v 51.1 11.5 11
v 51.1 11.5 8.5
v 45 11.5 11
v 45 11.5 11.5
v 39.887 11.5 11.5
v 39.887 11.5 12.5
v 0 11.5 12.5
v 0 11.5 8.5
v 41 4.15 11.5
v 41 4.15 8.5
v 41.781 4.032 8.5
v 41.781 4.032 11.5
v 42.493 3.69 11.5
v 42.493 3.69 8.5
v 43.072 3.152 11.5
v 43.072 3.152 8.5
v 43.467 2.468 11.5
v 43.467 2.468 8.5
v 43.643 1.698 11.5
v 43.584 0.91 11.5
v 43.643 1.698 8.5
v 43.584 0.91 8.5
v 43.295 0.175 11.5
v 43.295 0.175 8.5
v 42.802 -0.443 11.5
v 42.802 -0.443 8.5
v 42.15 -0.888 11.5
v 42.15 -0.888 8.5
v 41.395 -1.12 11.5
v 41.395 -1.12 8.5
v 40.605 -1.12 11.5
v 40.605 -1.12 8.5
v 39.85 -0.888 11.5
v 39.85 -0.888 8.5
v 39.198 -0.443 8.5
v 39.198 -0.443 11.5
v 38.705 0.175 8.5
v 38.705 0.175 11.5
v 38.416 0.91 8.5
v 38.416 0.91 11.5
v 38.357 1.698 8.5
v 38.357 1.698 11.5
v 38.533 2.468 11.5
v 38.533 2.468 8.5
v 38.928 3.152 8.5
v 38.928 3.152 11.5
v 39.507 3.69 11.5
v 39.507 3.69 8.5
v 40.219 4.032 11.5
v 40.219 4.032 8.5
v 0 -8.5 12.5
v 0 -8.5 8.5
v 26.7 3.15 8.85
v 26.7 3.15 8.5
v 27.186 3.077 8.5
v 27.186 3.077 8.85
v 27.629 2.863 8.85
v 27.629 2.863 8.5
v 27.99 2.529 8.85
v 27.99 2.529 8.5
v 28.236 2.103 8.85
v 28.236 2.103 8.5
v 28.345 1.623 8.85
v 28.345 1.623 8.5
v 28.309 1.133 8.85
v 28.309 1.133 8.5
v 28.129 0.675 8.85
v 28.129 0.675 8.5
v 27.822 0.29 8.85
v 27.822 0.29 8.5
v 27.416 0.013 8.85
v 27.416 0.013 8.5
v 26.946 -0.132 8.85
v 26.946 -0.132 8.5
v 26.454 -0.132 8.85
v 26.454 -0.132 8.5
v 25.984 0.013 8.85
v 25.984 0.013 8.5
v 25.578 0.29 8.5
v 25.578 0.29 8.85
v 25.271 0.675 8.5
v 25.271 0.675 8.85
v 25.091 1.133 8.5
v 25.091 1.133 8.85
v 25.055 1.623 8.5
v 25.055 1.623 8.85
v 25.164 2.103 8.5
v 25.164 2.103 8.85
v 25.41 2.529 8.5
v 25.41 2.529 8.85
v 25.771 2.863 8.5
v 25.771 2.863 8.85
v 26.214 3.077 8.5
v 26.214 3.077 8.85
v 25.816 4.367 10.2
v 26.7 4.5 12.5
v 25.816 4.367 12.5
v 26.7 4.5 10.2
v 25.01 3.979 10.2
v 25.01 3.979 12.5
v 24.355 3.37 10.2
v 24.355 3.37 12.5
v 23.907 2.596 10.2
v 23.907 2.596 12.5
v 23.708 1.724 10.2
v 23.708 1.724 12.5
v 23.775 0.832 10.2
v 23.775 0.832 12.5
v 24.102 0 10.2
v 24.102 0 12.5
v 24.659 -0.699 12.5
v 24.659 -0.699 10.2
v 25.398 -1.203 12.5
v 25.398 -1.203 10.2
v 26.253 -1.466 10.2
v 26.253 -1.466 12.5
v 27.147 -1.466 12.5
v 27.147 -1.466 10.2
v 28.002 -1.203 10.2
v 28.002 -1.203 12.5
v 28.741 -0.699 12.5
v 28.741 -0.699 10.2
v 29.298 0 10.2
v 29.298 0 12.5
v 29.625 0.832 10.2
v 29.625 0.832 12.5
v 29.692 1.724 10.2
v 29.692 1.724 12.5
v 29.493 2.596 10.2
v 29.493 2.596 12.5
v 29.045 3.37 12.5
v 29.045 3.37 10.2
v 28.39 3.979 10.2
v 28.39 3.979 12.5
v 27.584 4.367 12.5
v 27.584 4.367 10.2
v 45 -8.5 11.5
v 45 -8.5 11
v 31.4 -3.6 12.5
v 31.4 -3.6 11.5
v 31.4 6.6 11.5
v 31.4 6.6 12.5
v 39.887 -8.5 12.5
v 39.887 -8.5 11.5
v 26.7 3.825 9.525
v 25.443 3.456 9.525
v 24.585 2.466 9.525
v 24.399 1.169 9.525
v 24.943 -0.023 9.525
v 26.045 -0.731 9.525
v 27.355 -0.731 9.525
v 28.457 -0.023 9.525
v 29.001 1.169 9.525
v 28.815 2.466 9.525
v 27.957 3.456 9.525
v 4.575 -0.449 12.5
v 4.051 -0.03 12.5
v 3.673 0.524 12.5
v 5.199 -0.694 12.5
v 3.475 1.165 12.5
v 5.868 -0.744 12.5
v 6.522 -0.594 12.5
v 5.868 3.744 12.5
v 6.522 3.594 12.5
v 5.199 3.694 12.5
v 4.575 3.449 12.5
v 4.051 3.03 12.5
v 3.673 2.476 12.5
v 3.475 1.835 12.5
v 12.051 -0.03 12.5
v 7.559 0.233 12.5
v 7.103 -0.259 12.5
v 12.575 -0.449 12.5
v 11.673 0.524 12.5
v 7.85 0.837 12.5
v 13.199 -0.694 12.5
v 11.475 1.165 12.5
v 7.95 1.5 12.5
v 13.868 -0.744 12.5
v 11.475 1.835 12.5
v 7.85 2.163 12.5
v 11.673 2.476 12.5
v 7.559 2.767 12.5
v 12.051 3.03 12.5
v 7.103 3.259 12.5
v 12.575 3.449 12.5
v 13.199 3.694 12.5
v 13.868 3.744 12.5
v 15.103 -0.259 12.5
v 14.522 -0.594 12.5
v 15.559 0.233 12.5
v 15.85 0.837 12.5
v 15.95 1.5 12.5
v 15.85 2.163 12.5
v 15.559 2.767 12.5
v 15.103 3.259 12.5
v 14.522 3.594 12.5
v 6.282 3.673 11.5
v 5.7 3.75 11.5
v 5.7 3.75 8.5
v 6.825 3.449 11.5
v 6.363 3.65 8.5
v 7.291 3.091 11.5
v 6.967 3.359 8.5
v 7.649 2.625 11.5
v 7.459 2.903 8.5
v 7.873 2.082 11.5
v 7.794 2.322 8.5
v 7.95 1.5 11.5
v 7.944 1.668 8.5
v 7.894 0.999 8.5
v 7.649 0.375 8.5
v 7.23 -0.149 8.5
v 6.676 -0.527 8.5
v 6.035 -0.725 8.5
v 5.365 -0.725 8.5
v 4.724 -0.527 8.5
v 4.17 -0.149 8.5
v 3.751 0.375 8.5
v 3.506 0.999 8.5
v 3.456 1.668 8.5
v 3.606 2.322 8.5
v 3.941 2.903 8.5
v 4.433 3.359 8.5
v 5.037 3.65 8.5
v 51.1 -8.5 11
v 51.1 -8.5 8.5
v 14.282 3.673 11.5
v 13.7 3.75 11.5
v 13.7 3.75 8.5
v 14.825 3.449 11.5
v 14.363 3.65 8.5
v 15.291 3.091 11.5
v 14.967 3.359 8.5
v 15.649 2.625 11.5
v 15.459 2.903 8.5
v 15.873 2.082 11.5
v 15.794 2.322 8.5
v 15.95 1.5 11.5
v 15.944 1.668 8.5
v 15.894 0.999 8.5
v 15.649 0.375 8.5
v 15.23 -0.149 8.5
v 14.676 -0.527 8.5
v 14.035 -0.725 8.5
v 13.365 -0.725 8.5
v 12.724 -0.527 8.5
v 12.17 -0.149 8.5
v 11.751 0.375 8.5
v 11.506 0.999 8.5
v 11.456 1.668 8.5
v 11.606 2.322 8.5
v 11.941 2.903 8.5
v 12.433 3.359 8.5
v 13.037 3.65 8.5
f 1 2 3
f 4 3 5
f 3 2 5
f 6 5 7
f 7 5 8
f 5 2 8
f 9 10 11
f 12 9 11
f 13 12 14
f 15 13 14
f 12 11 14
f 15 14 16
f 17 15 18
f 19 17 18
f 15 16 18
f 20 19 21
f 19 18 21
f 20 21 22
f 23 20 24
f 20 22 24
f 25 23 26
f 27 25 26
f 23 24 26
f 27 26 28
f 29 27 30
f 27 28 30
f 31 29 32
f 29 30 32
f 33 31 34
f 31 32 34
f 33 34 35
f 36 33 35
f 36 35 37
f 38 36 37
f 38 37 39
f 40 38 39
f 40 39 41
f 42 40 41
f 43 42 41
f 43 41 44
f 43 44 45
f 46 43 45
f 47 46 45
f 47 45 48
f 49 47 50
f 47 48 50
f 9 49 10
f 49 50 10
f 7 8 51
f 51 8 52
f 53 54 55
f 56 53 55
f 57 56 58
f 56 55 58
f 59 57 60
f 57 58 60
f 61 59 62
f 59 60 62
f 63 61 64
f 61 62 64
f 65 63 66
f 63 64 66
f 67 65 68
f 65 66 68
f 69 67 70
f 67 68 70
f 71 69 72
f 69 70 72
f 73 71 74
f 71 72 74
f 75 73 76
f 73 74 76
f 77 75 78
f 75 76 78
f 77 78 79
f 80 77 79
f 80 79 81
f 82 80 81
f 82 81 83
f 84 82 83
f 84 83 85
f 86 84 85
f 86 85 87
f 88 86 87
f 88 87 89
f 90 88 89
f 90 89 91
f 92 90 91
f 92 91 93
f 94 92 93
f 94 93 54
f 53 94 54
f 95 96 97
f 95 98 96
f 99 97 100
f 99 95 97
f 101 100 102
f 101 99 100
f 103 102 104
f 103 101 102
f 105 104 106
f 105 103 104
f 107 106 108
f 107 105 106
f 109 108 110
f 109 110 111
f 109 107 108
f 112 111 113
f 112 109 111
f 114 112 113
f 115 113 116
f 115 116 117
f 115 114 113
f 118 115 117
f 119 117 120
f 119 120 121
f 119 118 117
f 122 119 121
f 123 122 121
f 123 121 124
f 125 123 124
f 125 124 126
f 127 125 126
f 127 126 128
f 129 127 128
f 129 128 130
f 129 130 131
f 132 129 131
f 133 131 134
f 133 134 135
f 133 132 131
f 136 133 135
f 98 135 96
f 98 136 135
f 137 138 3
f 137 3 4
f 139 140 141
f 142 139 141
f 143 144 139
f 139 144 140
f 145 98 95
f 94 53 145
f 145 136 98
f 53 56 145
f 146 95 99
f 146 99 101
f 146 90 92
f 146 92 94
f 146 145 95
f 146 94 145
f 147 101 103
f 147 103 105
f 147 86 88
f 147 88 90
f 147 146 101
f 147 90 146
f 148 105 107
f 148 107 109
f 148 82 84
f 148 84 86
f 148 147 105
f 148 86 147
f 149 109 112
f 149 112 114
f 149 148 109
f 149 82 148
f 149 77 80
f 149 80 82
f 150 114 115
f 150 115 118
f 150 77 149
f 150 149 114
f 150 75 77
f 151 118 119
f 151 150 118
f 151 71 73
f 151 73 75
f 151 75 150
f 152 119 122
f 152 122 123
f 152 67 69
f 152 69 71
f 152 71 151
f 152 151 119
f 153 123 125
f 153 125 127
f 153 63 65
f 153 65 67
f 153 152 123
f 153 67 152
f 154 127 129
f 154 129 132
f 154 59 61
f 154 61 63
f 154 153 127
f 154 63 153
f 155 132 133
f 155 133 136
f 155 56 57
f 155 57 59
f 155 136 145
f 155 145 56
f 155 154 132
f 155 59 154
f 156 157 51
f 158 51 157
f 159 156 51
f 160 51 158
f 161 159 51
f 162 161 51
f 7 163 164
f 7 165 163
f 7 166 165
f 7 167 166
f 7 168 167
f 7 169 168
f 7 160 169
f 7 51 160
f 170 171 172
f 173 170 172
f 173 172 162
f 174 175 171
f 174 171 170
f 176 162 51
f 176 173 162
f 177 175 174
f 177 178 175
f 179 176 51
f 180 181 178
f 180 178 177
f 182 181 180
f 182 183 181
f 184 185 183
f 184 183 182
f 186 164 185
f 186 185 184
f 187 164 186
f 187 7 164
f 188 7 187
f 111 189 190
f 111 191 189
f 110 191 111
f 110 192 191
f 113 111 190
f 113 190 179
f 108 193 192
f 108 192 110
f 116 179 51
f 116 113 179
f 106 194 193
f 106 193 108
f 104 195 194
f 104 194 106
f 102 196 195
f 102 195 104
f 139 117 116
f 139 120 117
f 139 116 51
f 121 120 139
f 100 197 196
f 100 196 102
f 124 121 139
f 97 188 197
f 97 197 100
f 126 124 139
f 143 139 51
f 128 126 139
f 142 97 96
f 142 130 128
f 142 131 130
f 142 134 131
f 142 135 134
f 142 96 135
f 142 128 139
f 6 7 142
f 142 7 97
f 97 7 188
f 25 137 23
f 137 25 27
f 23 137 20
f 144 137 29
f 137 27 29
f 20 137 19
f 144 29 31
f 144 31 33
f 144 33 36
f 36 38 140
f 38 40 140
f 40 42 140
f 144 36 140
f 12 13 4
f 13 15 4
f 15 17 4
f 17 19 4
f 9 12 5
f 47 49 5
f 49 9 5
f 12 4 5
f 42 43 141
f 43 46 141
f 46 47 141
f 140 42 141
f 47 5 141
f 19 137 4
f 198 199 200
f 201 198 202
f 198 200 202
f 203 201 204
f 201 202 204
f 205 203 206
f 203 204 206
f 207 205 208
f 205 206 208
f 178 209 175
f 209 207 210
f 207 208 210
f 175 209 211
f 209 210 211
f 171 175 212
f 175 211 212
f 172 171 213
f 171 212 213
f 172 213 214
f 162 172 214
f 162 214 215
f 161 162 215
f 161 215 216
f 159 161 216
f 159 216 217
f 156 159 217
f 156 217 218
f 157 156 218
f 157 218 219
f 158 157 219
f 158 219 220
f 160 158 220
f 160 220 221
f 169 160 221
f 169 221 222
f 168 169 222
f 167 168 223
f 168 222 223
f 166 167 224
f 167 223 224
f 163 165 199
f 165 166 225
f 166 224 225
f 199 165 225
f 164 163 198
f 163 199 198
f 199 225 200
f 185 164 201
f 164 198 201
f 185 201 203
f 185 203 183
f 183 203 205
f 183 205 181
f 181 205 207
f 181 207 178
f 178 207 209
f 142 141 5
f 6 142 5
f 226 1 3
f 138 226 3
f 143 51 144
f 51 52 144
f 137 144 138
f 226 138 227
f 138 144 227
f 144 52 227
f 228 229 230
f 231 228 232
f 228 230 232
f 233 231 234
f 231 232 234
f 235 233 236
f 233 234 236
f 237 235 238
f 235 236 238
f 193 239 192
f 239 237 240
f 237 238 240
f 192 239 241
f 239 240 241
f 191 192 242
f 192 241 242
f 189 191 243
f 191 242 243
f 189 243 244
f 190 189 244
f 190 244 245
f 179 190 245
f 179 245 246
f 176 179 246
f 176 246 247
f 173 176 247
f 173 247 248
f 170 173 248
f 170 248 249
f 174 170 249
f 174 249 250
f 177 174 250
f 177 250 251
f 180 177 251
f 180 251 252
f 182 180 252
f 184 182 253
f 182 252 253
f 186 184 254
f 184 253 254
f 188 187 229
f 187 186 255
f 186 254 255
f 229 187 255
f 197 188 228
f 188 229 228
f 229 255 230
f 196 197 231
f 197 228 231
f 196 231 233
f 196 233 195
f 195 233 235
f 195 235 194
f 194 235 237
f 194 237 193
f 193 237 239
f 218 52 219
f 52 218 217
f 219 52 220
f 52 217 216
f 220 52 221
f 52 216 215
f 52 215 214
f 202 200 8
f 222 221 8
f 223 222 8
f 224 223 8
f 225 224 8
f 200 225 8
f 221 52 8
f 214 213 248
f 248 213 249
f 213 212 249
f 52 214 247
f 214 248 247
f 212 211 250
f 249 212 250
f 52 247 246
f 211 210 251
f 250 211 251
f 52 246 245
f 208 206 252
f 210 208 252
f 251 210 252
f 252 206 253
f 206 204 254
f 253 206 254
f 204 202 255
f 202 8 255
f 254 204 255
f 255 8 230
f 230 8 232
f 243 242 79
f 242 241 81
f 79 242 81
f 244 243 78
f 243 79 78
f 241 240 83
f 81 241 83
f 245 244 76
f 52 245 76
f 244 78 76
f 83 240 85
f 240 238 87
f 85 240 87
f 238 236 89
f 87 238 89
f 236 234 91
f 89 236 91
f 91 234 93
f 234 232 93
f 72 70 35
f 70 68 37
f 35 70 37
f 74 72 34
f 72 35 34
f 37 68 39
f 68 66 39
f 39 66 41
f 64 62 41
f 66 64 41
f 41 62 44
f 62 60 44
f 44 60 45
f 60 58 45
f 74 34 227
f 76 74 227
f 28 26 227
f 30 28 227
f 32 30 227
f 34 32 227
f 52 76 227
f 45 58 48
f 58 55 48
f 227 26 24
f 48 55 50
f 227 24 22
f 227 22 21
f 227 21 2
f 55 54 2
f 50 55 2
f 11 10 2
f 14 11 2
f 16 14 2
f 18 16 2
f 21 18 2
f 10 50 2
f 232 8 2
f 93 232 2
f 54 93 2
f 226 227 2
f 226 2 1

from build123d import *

# Parameters (mm, degrees)
AUFSATZ_LINEAR_AUSTRAGEN1_DEPTH    = 20
SKIZZE2_R                          = 1.6499999999999988
SKIZZE2_R_2                        = 2.65
SKIZZE2_R_3                        = 2.250000000000001
SCHNITT_LINEAR_AUSTRAGEN1_DEPTH    = 3
SKIZZE3_R                          = 2.250000000000001
SKIZZE3_R_2                        = 1.6499999999999988
AUFSATZ_LINEAR_AUSTRAGEN2_DEPTH    = 1
SKIZZE5_W                          = 1.9999999999999998
SKIZZE5_H                          = 2
SCHNITT_LINEAR_AUSTRAGEN2_DEPTH    = 1
K_RPER_VERSCHIEBEN_KOPIEREN1_ANGLE = 90.00000000007478


with BuildPart() as part:
    # Skizze1 → Aufsatz-Linear austragen1 (new body)
    with BuildSketch(Plane.XY):
        Polygon((0, 0), (51.099999999999994, 0), (51.1, 2.5), (45, 2.499999999999999), (45, 3.0000000000000058), (6e-16, 3), align=None)
    extrude(amount=AUFSATZ_LINEAR_AUSTRAGEN1_DEPTH)

    # Skizze2 → Schnitt-Linear austragen1 (cut)
    with BuildSketch(Plane.XZ):
        with Locations(Location((26.699999999999996, 9.999999999999998, 0), (0, 0, 270))):
            Circle(SKIZZE2_R)
        with Locations(Location((40.99999999999999, 10, 0), (0, 0, 270))):
            Circle(SKIZZE2_R_2)
        with Locations(Location((13.699999999999996, 10, 0), (0, 0, 270))):
            Circle(SKIZZE2_R_3)
        with Locations(Location((5.699999999999995, 9.999999999999998, 0), (0, 0, 270))):
            Circle(SKIZZE2_R_3)
    extrude(amount=-SCHNITT_LINEAR_AUSTRAGEN1_DEPTH, mode=Mode.SUBTRACT)

    # Skizze3 → Aufsatz-Linear austragen2 (add)
    with BuildSketch(Plane(origin=(-3.8e-16, 3, 0), x_dir=(1, 1.2e-16, 0), z_dir=(-1.2e-16, 1, 0))):
        Polygon((39.887048957087536, 0), (9.5e-16, 0), (9.5e-16, -8), (-1.9999999999999987, -8), (-1.9999999999999987, -10), (9.5e-16, -10), (9.5e-16, -20), (39.887048957087536, -19.99999999999999), (31.39999999999999, -15.1), (31.39999999999999, -4.900000000000001), align=None)
        with Locations((5.699999999999995, -9.999999999999998)):
            Circle(SKIZZE3_R, mode=Mode.SUBTRACT)
        with Locations((13.699999999999996, -10)):
            Circle(SKIZZE3_R, mode=Mode.SUBTRACT)
        with Locations((26.699999999999996, -9.999999999999998)):
            Circle(SKIZZE3_R_2, mode=Mode.SUBTRACT)
    extrude(amount=AUFSATZ_LINEAR_AUSTRAGEN2_DEPTH)

    # Skizze4 → Schnitt-Rotation3 (revolve, cut)
    with BuildSketch(Plane.XY.offset(10), mode=Mode.PRIVATE) as schnitt_rotation3_sk:
        Polygon((23.699999999999996, 3.9999999999999964), (23.699999999999996, 1.699999999999991), (25.199999999999992, 0.2), (26.699999999999996, 0.2000000000000001), (26.699999999999996, 3.9999999999999964), align=None)
    revolve(schnitt_rotation3_sk.sketch.rotate(Axis((26.699999999999996, 0.2000000000000001, 10), (0, 1, 0)), 270), axis=Axis((26.699999999999996, 0.2000000000000001, 10), (0, 1, 0)), mode=Mode.SUBTRACT)

    # Skizze5 → Schnitt-Linear austragen2 (cut)
    with BuildSketch(Plane(origin=(0, 4, 0), x_dir=(1, 0, 0), z_dir=(0, 1, 0))):
        with Locations((-1, -9)):
            Rectangle(SKIZZE5_W, SKIZZE5_H)
    extrude(amount=-SCHNITT_LINEAR_AUSTRAGEN2_DEPTH, mode=Mode.SUBTRACT)


with BuildPart() as part_1:
    # Körper-Verschieben/Kopieren1: moved
    add(part.part.rotate(Axis((0, 1.500000000000004, 9.999999999999998), (1, 0, 0)), K_RPER_VERSCHIEBEN_KOPIEREN1_ANGLE))


solid = part_1.part
